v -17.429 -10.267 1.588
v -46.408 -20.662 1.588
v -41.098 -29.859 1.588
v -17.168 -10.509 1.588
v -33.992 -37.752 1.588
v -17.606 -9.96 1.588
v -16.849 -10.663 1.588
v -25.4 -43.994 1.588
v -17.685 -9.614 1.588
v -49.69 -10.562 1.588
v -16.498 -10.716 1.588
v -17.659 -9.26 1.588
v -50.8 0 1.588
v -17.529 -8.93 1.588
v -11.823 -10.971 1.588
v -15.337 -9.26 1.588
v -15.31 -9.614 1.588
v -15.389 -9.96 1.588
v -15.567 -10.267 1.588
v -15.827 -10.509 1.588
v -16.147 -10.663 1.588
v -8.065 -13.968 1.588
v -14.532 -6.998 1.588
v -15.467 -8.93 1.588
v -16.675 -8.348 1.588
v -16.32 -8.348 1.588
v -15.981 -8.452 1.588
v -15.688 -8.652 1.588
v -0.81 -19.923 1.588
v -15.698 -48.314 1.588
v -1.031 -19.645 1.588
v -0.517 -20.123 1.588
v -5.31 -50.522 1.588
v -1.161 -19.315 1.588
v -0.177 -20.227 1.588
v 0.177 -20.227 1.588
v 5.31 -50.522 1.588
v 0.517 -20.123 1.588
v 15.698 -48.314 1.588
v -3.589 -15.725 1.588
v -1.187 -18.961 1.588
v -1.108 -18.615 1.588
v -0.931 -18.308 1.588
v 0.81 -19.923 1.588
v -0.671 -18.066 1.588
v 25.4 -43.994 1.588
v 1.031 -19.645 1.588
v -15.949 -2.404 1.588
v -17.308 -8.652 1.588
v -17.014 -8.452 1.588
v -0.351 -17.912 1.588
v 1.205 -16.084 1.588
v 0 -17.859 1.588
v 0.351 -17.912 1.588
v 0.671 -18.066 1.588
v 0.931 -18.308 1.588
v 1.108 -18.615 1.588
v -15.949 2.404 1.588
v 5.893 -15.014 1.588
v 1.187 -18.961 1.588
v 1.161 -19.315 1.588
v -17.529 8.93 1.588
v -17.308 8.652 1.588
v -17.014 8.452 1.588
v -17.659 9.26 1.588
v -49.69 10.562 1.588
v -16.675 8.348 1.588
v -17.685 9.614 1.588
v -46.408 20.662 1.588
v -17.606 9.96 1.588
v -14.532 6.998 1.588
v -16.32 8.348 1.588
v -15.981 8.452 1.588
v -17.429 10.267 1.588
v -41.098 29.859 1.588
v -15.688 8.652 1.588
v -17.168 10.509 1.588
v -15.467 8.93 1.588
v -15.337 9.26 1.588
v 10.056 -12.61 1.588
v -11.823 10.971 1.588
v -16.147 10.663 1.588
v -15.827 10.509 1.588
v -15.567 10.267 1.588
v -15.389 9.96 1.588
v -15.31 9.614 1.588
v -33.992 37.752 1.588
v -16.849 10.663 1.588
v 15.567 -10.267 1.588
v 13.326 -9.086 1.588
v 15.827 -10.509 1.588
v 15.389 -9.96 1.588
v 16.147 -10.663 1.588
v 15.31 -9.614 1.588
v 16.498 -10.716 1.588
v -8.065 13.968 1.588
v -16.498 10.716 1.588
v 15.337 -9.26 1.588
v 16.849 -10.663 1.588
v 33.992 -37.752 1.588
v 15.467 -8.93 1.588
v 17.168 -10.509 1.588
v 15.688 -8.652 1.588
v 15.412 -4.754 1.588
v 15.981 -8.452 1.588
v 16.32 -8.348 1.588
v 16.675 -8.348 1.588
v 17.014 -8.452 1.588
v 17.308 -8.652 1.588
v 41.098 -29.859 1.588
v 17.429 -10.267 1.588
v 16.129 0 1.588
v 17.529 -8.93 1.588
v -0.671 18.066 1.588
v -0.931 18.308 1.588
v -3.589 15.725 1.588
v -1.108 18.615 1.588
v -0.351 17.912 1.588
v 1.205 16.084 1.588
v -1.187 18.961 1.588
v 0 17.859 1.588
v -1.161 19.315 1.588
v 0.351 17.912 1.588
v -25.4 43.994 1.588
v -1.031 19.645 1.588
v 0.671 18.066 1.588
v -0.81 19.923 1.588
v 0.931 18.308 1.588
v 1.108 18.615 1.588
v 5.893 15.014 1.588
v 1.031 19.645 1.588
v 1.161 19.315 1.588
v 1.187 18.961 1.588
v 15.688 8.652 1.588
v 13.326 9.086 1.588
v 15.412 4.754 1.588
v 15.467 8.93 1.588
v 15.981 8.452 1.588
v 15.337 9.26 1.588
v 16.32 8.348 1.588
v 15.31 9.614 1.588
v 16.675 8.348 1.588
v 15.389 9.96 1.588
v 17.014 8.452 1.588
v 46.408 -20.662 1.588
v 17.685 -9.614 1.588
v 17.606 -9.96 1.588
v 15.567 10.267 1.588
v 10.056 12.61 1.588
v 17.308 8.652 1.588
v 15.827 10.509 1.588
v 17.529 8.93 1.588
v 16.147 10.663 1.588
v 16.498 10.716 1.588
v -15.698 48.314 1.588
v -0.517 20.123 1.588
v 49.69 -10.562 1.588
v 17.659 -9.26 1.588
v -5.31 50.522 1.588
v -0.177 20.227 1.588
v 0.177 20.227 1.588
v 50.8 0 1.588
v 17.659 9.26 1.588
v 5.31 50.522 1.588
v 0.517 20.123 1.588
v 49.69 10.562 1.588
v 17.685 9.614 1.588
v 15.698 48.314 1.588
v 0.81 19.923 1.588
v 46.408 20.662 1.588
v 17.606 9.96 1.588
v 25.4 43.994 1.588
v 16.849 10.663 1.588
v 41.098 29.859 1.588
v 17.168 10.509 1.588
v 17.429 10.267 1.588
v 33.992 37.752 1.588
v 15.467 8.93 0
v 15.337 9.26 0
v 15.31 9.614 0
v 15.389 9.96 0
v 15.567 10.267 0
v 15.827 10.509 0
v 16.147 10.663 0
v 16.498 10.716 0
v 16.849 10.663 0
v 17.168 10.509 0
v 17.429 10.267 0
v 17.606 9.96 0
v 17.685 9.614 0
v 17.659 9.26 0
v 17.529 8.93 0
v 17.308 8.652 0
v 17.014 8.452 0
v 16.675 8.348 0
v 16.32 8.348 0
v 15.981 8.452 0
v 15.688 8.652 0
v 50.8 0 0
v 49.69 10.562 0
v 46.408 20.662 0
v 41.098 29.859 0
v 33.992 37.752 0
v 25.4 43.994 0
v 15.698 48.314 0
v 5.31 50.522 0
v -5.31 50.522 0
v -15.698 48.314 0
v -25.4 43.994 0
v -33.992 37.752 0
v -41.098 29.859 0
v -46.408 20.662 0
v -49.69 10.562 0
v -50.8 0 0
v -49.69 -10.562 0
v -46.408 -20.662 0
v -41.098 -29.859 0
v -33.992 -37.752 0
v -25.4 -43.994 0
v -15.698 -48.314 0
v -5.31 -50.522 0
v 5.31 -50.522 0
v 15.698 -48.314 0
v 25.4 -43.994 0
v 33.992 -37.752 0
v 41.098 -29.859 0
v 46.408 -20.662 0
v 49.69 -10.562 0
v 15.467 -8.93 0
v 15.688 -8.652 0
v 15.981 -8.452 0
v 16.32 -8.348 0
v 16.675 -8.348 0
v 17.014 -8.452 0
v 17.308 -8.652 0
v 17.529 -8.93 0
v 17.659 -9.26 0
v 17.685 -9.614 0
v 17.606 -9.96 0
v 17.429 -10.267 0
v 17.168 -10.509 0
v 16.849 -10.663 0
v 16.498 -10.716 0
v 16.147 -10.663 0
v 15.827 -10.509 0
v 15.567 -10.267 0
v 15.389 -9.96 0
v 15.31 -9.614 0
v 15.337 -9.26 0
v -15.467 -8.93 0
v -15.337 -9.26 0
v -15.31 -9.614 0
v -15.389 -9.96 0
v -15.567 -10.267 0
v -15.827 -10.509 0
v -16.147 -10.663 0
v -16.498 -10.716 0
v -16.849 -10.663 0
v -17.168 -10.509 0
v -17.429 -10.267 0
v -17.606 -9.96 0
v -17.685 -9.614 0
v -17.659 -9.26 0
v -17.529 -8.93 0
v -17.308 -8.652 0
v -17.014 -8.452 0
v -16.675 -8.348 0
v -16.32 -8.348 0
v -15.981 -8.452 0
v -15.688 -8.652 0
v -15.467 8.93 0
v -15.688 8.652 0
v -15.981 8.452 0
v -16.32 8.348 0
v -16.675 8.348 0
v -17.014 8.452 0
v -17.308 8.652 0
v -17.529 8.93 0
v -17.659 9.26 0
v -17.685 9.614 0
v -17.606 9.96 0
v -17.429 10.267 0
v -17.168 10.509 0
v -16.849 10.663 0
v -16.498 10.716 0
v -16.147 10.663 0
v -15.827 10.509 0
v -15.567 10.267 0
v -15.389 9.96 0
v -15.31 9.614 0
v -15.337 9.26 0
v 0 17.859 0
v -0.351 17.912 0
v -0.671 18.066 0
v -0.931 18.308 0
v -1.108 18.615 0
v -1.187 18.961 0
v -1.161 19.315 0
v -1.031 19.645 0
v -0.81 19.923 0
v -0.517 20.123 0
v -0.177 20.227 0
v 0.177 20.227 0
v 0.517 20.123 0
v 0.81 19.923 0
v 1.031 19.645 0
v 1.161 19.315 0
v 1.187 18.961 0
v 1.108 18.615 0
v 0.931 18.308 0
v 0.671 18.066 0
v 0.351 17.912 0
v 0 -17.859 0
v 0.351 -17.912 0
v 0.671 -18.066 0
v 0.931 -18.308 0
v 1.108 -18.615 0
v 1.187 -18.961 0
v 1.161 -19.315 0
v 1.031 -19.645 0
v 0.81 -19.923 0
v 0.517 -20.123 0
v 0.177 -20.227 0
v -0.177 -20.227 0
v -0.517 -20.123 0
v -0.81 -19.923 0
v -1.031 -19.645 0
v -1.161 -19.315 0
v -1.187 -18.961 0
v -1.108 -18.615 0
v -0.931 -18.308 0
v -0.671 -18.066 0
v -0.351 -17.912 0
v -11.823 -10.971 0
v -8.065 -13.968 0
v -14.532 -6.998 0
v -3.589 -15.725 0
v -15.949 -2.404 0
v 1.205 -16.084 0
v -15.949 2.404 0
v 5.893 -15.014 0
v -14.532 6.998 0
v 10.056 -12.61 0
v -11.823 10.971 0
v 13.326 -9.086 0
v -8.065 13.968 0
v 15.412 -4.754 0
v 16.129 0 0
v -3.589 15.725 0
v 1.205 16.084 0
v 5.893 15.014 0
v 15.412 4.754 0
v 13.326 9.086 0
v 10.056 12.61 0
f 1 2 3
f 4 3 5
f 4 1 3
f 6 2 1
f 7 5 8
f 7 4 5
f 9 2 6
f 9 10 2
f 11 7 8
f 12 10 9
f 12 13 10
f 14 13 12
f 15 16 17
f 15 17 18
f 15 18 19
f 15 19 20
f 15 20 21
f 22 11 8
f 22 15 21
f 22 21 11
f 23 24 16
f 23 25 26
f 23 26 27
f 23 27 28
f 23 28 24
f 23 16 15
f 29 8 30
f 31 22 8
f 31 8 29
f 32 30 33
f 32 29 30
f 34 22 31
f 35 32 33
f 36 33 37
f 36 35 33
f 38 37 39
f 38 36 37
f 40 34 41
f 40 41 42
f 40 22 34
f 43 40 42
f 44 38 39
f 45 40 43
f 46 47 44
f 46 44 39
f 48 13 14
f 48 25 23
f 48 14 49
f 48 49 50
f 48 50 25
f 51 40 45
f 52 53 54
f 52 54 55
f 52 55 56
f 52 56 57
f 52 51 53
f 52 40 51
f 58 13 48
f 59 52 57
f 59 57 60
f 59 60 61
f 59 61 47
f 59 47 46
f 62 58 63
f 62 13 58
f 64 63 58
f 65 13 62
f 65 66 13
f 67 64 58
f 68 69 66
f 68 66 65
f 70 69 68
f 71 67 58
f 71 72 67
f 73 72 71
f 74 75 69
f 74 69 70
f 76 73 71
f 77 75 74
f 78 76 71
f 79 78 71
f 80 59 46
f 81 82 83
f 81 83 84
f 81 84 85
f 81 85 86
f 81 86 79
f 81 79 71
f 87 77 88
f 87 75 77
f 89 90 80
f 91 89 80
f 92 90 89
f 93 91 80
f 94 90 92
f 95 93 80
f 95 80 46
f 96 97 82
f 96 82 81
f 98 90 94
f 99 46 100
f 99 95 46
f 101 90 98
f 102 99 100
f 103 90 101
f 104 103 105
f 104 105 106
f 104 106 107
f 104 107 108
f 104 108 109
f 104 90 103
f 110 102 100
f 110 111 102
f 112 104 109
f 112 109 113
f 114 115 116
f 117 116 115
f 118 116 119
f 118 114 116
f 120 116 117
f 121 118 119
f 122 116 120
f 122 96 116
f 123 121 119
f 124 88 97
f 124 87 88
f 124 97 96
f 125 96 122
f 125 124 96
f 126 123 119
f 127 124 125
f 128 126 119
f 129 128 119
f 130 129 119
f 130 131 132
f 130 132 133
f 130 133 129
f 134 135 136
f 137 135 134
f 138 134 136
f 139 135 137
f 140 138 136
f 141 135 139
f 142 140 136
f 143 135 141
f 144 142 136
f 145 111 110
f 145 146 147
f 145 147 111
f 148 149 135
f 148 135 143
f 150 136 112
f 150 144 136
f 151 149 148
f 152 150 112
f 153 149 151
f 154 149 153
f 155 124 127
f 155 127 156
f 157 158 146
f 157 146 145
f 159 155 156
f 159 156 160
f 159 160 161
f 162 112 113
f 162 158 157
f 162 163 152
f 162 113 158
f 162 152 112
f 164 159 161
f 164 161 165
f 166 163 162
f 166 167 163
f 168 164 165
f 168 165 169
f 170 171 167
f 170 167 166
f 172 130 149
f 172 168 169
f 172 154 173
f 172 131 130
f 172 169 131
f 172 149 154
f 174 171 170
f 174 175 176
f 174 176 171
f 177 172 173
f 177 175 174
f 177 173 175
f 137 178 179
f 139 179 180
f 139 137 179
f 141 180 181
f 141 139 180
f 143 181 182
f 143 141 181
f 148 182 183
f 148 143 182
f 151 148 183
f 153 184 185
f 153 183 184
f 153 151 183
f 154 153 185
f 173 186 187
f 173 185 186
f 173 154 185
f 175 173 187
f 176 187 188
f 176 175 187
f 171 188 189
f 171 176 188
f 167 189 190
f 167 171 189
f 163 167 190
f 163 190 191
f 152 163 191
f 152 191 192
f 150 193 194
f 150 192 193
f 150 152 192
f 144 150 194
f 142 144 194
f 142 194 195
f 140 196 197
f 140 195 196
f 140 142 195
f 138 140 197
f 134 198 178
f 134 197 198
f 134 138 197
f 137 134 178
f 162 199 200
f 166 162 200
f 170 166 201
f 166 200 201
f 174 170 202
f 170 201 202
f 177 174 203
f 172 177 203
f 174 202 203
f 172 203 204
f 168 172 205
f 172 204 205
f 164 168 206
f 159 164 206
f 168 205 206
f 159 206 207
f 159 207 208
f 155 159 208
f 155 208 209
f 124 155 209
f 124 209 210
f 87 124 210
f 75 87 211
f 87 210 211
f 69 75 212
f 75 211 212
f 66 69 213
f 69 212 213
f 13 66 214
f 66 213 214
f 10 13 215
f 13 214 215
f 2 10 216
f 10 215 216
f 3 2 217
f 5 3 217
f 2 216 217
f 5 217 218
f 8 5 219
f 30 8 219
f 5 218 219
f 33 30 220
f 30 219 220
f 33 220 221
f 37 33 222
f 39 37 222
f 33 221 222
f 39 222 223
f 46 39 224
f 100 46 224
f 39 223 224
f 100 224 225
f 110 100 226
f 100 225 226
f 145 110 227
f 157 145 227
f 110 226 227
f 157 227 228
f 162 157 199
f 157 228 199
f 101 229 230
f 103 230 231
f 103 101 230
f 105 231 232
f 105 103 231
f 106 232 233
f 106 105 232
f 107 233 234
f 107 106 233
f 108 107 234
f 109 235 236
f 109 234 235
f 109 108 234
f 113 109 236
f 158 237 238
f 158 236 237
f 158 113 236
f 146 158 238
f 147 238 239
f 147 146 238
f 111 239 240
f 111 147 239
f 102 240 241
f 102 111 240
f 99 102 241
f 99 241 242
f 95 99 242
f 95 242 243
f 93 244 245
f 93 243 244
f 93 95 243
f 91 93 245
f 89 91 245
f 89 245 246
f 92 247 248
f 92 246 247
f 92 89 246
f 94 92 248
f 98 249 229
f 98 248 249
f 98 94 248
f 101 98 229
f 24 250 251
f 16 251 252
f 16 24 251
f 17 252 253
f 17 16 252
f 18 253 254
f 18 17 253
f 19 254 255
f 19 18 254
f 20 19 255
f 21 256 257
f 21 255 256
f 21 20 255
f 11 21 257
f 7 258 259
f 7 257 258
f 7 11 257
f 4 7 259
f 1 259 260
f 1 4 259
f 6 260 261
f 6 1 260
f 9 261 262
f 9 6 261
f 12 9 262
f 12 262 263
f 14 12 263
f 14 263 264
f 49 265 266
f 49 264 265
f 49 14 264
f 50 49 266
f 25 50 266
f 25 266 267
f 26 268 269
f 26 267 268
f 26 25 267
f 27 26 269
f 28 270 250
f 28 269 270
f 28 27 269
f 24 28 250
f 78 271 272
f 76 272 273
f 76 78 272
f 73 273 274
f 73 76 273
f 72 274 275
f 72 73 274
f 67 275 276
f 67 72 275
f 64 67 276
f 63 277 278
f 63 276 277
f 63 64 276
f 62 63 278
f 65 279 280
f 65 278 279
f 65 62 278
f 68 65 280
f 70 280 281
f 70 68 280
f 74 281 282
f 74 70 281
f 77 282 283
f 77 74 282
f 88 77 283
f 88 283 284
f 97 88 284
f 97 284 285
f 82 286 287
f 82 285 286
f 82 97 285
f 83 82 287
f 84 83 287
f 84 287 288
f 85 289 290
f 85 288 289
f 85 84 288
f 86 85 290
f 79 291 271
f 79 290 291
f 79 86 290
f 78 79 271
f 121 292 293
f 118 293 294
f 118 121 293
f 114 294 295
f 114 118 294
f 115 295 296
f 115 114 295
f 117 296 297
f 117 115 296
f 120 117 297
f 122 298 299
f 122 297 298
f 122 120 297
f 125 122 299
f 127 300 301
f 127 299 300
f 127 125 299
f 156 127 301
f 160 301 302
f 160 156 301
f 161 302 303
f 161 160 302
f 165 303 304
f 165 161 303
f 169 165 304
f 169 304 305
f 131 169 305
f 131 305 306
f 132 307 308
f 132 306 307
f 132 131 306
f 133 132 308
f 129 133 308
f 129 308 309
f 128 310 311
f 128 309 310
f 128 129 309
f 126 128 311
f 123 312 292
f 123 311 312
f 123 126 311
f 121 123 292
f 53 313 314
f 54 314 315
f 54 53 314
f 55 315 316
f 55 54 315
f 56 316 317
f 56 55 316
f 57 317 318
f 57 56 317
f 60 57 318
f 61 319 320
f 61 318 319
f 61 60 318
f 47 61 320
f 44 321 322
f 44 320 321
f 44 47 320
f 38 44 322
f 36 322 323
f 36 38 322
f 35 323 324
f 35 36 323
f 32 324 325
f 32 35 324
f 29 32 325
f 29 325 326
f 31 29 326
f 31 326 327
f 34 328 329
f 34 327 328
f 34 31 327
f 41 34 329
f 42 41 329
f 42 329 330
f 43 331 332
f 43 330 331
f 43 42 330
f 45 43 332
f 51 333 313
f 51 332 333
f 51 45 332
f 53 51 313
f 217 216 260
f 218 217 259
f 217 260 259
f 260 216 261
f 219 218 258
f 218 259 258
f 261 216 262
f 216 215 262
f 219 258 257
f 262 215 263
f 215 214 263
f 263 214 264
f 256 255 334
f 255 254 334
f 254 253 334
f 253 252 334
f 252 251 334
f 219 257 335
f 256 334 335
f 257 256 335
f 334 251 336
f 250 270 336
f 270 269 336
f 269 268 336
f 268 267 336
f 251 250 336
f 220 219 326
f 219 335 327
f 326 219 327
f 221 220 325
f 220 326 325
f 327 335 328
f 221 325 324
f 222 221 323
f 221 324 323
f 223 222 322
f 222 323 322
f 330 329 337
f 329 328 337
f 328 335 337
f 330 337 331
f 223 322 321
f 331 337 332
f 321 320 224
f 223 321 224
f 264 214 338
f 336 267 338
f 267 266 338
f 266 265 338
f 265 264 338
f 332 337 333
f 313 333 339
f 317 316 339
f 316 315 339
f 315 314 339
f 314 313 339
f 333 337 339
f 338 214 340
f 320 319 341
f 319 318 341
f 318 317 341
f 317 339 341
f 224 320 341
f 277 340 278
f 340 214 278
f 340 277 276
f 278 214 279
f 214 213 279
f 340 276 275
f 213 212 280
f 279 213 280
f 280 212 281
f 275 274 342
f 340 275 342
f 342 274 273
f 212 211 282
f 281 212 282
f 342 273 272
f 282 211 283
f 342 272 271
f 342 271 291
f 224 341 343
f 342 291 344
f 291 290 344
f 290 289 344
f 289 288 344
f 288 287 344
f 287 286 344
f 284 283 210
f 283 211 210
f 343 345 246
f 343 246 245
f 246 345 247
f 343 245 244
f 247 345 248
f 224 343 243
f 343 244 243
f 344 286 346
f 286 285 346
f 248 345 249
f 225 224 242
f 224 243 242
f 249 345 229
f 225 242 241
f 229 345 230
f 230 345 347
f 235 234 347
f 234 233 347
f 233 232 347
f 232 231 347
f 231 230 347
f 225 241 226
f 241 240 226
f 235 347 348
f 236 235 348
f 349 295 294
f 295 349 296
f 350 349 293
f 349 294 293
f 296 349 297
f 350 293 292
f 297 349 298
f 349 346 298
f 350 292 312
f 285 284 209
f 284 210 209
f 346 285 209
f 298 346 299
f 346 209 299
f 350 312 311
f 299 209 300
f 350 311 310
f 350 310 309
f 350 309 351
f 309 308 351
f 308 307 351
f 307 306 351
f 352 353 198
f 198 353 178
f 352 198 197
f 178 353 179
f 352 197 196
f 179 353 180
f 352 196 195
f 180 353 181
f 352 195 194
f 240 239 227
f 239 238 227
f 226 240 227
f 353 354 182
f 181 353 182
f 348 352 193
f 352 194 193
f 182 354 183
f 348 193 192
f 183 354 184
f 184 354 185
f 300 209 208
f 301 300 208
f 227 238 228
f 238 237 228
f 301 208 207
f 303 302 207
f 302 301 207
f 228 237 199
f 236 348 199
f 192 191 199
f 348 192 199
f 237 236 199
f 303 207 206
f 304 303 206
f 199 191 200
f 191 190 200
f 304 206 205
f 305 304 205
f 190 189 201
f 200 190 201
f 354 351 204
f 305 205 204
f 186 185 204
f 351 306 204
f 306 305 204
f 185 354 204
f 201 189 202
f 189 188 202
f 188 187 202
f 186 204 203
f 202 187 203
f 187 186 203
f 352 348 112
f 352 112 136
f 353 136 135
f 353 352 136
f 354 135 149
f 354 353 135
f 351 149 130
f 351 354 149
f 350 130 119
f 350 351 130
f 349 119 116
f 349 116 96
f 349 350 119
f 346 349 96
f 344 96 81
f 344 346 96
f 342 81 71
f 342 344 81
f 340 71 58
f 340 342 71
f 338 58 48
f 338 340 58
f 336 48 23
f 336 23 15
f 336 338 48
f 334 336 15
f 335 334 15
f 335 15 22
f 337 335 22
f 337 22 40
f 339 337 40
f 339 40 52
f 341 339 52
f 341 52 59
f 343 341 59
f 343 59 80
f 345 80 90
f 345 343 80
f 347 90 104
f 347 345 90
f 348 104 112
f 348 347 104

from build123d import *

# Parameters (mm, degrees)
SKETCH1_R           = 50.8
SKETCH1_R_2         = 16.129
BOSS_EXTRUDE1_DEPTH = 1.5875
CIRPATTERN1_COUNT   = 6


with BuildPart() as part:
    # Sketch1 → Boss-Extrude1 (new body)
    with BuildSketch(Plane.XY):
        Circle(SKETCH1_R)
        Circle(SKETCH1_R_2, mode=Mode.SUBTRACT)
    extrude(amount=BOSS_EXTRUDE1_DEPTH)

    # Sketch2 → 3/32 (0.09375) Diameter Hole1 (revolve, cut)
    with BuildSketch(Plane(origin=(0, 19.05, 1.5875), x_dir=(0, -1, 0), z_dir=(1, 0, 0))):
        Polygon((0, 0), (0, 26.115399675), (1.190625, 25.4), (1.190625, 0), align=None)
    f_3_32_0_09375_diameter_hole1 = revolve(axis=Axis((0, 19.05, 7.9375), (0, 0, -1)), mode=Mode.SUBTRACT)

    # CirPattern1: 3/32 (0.09375) Diameter Hole1 ×6 about axis
    cirpattern1_axis = Axis((0, 0, 0), (0, 0, 1))
    for i in range(1, CIRPATTERN1_COUNT):
        add(f_3_32_0_09375_diameter_hole1.rotate(cirpattern1_axis, i * 360 / CIRPATTERN1_COUNT), mode=Mode.SUBTRACT)


solid = part.part
